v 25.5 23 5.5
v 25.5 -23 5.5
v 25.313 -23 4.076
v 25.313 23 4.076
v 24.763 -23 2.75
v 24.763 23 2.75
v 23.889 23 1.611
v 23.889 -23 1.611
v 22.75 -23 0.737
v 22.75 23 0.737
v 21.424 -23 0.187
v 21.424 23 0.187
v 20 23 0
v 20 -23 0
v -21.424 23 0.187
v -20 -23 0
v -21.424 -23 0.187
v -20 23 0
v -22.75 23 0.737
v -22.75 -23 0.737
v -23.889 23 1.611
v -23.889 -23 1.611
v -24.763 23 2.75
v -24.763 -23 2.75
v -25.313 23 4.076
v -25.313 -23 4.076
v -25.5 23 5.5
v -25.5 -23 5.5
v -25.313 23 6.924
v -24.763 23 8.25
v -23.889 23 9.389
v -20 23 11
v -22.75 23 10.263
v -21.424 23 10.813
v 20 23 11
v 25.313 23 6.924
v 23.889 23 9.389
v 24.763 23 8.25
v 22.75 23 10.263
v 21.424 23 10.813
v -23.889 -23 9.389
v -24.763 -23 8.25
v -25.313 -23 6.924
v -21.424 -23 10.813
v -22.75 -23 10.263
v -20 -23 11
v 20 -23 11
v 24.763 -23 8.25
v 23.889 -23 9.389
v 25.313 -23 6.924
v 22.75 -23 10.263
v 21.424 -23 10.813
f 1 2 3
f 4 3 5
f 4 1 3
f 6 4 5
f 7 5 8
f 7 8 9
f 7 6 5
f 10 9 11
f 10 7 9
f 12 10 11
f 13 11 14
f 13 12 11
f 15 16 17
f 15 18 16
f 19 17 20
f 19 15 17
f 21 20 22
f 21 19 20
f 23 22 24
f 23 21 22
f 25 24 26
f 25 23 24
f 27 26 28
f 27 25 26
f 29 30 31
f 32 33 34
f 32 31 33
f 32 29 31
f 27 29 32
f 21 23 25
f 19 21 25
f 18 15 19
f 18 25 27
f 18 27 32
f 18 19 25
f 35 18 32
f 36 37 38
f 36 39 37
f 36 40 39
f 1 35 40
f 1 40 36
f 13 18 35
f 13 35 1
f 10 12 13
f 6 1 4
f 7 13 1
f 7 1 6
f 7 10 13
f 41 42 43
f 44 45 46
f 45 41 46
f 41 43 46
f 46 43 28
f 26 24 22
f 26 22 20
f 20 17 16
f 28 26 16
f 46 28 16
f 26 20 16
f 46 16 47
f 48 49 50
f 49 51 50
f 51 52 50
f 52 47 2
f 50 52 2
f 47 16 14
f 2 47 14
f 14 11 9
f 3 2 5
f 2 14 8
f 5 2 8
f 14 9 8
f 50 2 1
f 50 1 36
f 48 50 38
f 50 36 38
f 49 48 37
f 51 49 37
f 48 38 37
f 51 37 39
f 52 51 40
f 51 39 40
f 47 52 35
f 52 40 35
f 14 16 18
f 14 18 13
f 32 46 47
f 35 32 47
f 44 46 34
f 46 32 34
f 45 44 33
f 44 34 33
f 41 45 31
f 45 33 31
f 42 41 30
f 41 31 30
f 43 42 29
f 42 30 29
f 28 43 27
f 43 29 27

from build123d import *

# Parameters (mm, degrees)
SKETCH1_W           = 51
SKETCH1_H           = 46
BOSS_EXTRUDE1_DEPTH = 11
FILLET2_R           = 5.5
FILLET3_R           = 5.5


with BuildPart() as part:
    # Sketch1 → Boss-Extrude1 (new body)
    with BuildSketch(Plane.XY):
        Rectangle(SKETCH1_W, SKETCH1_H)
    extrude(amount=BOSS_EXTRUDE1_DEPTH)

    # Fillet2
    fillet2_edges = [part.edges().sort_by_distance(p)[0] for p in [
        (25.5, 0, 11),
    ]]
    fillet(fillet2_edges, radius=FILLET2_R)

    # Fillet3
    fillet3_edges = [part.edges().sort_by_distance(p)[0] for p in [
        (-25.5, 0, 11),
        (-25.5, 0, 0),
        (25.5, 0, 0),
    ]]
    fillet(fillet3_edges, radius=FILLET3_R - 0.0001)  # a hair under: the kernel refuses the full size


solid = part.part
